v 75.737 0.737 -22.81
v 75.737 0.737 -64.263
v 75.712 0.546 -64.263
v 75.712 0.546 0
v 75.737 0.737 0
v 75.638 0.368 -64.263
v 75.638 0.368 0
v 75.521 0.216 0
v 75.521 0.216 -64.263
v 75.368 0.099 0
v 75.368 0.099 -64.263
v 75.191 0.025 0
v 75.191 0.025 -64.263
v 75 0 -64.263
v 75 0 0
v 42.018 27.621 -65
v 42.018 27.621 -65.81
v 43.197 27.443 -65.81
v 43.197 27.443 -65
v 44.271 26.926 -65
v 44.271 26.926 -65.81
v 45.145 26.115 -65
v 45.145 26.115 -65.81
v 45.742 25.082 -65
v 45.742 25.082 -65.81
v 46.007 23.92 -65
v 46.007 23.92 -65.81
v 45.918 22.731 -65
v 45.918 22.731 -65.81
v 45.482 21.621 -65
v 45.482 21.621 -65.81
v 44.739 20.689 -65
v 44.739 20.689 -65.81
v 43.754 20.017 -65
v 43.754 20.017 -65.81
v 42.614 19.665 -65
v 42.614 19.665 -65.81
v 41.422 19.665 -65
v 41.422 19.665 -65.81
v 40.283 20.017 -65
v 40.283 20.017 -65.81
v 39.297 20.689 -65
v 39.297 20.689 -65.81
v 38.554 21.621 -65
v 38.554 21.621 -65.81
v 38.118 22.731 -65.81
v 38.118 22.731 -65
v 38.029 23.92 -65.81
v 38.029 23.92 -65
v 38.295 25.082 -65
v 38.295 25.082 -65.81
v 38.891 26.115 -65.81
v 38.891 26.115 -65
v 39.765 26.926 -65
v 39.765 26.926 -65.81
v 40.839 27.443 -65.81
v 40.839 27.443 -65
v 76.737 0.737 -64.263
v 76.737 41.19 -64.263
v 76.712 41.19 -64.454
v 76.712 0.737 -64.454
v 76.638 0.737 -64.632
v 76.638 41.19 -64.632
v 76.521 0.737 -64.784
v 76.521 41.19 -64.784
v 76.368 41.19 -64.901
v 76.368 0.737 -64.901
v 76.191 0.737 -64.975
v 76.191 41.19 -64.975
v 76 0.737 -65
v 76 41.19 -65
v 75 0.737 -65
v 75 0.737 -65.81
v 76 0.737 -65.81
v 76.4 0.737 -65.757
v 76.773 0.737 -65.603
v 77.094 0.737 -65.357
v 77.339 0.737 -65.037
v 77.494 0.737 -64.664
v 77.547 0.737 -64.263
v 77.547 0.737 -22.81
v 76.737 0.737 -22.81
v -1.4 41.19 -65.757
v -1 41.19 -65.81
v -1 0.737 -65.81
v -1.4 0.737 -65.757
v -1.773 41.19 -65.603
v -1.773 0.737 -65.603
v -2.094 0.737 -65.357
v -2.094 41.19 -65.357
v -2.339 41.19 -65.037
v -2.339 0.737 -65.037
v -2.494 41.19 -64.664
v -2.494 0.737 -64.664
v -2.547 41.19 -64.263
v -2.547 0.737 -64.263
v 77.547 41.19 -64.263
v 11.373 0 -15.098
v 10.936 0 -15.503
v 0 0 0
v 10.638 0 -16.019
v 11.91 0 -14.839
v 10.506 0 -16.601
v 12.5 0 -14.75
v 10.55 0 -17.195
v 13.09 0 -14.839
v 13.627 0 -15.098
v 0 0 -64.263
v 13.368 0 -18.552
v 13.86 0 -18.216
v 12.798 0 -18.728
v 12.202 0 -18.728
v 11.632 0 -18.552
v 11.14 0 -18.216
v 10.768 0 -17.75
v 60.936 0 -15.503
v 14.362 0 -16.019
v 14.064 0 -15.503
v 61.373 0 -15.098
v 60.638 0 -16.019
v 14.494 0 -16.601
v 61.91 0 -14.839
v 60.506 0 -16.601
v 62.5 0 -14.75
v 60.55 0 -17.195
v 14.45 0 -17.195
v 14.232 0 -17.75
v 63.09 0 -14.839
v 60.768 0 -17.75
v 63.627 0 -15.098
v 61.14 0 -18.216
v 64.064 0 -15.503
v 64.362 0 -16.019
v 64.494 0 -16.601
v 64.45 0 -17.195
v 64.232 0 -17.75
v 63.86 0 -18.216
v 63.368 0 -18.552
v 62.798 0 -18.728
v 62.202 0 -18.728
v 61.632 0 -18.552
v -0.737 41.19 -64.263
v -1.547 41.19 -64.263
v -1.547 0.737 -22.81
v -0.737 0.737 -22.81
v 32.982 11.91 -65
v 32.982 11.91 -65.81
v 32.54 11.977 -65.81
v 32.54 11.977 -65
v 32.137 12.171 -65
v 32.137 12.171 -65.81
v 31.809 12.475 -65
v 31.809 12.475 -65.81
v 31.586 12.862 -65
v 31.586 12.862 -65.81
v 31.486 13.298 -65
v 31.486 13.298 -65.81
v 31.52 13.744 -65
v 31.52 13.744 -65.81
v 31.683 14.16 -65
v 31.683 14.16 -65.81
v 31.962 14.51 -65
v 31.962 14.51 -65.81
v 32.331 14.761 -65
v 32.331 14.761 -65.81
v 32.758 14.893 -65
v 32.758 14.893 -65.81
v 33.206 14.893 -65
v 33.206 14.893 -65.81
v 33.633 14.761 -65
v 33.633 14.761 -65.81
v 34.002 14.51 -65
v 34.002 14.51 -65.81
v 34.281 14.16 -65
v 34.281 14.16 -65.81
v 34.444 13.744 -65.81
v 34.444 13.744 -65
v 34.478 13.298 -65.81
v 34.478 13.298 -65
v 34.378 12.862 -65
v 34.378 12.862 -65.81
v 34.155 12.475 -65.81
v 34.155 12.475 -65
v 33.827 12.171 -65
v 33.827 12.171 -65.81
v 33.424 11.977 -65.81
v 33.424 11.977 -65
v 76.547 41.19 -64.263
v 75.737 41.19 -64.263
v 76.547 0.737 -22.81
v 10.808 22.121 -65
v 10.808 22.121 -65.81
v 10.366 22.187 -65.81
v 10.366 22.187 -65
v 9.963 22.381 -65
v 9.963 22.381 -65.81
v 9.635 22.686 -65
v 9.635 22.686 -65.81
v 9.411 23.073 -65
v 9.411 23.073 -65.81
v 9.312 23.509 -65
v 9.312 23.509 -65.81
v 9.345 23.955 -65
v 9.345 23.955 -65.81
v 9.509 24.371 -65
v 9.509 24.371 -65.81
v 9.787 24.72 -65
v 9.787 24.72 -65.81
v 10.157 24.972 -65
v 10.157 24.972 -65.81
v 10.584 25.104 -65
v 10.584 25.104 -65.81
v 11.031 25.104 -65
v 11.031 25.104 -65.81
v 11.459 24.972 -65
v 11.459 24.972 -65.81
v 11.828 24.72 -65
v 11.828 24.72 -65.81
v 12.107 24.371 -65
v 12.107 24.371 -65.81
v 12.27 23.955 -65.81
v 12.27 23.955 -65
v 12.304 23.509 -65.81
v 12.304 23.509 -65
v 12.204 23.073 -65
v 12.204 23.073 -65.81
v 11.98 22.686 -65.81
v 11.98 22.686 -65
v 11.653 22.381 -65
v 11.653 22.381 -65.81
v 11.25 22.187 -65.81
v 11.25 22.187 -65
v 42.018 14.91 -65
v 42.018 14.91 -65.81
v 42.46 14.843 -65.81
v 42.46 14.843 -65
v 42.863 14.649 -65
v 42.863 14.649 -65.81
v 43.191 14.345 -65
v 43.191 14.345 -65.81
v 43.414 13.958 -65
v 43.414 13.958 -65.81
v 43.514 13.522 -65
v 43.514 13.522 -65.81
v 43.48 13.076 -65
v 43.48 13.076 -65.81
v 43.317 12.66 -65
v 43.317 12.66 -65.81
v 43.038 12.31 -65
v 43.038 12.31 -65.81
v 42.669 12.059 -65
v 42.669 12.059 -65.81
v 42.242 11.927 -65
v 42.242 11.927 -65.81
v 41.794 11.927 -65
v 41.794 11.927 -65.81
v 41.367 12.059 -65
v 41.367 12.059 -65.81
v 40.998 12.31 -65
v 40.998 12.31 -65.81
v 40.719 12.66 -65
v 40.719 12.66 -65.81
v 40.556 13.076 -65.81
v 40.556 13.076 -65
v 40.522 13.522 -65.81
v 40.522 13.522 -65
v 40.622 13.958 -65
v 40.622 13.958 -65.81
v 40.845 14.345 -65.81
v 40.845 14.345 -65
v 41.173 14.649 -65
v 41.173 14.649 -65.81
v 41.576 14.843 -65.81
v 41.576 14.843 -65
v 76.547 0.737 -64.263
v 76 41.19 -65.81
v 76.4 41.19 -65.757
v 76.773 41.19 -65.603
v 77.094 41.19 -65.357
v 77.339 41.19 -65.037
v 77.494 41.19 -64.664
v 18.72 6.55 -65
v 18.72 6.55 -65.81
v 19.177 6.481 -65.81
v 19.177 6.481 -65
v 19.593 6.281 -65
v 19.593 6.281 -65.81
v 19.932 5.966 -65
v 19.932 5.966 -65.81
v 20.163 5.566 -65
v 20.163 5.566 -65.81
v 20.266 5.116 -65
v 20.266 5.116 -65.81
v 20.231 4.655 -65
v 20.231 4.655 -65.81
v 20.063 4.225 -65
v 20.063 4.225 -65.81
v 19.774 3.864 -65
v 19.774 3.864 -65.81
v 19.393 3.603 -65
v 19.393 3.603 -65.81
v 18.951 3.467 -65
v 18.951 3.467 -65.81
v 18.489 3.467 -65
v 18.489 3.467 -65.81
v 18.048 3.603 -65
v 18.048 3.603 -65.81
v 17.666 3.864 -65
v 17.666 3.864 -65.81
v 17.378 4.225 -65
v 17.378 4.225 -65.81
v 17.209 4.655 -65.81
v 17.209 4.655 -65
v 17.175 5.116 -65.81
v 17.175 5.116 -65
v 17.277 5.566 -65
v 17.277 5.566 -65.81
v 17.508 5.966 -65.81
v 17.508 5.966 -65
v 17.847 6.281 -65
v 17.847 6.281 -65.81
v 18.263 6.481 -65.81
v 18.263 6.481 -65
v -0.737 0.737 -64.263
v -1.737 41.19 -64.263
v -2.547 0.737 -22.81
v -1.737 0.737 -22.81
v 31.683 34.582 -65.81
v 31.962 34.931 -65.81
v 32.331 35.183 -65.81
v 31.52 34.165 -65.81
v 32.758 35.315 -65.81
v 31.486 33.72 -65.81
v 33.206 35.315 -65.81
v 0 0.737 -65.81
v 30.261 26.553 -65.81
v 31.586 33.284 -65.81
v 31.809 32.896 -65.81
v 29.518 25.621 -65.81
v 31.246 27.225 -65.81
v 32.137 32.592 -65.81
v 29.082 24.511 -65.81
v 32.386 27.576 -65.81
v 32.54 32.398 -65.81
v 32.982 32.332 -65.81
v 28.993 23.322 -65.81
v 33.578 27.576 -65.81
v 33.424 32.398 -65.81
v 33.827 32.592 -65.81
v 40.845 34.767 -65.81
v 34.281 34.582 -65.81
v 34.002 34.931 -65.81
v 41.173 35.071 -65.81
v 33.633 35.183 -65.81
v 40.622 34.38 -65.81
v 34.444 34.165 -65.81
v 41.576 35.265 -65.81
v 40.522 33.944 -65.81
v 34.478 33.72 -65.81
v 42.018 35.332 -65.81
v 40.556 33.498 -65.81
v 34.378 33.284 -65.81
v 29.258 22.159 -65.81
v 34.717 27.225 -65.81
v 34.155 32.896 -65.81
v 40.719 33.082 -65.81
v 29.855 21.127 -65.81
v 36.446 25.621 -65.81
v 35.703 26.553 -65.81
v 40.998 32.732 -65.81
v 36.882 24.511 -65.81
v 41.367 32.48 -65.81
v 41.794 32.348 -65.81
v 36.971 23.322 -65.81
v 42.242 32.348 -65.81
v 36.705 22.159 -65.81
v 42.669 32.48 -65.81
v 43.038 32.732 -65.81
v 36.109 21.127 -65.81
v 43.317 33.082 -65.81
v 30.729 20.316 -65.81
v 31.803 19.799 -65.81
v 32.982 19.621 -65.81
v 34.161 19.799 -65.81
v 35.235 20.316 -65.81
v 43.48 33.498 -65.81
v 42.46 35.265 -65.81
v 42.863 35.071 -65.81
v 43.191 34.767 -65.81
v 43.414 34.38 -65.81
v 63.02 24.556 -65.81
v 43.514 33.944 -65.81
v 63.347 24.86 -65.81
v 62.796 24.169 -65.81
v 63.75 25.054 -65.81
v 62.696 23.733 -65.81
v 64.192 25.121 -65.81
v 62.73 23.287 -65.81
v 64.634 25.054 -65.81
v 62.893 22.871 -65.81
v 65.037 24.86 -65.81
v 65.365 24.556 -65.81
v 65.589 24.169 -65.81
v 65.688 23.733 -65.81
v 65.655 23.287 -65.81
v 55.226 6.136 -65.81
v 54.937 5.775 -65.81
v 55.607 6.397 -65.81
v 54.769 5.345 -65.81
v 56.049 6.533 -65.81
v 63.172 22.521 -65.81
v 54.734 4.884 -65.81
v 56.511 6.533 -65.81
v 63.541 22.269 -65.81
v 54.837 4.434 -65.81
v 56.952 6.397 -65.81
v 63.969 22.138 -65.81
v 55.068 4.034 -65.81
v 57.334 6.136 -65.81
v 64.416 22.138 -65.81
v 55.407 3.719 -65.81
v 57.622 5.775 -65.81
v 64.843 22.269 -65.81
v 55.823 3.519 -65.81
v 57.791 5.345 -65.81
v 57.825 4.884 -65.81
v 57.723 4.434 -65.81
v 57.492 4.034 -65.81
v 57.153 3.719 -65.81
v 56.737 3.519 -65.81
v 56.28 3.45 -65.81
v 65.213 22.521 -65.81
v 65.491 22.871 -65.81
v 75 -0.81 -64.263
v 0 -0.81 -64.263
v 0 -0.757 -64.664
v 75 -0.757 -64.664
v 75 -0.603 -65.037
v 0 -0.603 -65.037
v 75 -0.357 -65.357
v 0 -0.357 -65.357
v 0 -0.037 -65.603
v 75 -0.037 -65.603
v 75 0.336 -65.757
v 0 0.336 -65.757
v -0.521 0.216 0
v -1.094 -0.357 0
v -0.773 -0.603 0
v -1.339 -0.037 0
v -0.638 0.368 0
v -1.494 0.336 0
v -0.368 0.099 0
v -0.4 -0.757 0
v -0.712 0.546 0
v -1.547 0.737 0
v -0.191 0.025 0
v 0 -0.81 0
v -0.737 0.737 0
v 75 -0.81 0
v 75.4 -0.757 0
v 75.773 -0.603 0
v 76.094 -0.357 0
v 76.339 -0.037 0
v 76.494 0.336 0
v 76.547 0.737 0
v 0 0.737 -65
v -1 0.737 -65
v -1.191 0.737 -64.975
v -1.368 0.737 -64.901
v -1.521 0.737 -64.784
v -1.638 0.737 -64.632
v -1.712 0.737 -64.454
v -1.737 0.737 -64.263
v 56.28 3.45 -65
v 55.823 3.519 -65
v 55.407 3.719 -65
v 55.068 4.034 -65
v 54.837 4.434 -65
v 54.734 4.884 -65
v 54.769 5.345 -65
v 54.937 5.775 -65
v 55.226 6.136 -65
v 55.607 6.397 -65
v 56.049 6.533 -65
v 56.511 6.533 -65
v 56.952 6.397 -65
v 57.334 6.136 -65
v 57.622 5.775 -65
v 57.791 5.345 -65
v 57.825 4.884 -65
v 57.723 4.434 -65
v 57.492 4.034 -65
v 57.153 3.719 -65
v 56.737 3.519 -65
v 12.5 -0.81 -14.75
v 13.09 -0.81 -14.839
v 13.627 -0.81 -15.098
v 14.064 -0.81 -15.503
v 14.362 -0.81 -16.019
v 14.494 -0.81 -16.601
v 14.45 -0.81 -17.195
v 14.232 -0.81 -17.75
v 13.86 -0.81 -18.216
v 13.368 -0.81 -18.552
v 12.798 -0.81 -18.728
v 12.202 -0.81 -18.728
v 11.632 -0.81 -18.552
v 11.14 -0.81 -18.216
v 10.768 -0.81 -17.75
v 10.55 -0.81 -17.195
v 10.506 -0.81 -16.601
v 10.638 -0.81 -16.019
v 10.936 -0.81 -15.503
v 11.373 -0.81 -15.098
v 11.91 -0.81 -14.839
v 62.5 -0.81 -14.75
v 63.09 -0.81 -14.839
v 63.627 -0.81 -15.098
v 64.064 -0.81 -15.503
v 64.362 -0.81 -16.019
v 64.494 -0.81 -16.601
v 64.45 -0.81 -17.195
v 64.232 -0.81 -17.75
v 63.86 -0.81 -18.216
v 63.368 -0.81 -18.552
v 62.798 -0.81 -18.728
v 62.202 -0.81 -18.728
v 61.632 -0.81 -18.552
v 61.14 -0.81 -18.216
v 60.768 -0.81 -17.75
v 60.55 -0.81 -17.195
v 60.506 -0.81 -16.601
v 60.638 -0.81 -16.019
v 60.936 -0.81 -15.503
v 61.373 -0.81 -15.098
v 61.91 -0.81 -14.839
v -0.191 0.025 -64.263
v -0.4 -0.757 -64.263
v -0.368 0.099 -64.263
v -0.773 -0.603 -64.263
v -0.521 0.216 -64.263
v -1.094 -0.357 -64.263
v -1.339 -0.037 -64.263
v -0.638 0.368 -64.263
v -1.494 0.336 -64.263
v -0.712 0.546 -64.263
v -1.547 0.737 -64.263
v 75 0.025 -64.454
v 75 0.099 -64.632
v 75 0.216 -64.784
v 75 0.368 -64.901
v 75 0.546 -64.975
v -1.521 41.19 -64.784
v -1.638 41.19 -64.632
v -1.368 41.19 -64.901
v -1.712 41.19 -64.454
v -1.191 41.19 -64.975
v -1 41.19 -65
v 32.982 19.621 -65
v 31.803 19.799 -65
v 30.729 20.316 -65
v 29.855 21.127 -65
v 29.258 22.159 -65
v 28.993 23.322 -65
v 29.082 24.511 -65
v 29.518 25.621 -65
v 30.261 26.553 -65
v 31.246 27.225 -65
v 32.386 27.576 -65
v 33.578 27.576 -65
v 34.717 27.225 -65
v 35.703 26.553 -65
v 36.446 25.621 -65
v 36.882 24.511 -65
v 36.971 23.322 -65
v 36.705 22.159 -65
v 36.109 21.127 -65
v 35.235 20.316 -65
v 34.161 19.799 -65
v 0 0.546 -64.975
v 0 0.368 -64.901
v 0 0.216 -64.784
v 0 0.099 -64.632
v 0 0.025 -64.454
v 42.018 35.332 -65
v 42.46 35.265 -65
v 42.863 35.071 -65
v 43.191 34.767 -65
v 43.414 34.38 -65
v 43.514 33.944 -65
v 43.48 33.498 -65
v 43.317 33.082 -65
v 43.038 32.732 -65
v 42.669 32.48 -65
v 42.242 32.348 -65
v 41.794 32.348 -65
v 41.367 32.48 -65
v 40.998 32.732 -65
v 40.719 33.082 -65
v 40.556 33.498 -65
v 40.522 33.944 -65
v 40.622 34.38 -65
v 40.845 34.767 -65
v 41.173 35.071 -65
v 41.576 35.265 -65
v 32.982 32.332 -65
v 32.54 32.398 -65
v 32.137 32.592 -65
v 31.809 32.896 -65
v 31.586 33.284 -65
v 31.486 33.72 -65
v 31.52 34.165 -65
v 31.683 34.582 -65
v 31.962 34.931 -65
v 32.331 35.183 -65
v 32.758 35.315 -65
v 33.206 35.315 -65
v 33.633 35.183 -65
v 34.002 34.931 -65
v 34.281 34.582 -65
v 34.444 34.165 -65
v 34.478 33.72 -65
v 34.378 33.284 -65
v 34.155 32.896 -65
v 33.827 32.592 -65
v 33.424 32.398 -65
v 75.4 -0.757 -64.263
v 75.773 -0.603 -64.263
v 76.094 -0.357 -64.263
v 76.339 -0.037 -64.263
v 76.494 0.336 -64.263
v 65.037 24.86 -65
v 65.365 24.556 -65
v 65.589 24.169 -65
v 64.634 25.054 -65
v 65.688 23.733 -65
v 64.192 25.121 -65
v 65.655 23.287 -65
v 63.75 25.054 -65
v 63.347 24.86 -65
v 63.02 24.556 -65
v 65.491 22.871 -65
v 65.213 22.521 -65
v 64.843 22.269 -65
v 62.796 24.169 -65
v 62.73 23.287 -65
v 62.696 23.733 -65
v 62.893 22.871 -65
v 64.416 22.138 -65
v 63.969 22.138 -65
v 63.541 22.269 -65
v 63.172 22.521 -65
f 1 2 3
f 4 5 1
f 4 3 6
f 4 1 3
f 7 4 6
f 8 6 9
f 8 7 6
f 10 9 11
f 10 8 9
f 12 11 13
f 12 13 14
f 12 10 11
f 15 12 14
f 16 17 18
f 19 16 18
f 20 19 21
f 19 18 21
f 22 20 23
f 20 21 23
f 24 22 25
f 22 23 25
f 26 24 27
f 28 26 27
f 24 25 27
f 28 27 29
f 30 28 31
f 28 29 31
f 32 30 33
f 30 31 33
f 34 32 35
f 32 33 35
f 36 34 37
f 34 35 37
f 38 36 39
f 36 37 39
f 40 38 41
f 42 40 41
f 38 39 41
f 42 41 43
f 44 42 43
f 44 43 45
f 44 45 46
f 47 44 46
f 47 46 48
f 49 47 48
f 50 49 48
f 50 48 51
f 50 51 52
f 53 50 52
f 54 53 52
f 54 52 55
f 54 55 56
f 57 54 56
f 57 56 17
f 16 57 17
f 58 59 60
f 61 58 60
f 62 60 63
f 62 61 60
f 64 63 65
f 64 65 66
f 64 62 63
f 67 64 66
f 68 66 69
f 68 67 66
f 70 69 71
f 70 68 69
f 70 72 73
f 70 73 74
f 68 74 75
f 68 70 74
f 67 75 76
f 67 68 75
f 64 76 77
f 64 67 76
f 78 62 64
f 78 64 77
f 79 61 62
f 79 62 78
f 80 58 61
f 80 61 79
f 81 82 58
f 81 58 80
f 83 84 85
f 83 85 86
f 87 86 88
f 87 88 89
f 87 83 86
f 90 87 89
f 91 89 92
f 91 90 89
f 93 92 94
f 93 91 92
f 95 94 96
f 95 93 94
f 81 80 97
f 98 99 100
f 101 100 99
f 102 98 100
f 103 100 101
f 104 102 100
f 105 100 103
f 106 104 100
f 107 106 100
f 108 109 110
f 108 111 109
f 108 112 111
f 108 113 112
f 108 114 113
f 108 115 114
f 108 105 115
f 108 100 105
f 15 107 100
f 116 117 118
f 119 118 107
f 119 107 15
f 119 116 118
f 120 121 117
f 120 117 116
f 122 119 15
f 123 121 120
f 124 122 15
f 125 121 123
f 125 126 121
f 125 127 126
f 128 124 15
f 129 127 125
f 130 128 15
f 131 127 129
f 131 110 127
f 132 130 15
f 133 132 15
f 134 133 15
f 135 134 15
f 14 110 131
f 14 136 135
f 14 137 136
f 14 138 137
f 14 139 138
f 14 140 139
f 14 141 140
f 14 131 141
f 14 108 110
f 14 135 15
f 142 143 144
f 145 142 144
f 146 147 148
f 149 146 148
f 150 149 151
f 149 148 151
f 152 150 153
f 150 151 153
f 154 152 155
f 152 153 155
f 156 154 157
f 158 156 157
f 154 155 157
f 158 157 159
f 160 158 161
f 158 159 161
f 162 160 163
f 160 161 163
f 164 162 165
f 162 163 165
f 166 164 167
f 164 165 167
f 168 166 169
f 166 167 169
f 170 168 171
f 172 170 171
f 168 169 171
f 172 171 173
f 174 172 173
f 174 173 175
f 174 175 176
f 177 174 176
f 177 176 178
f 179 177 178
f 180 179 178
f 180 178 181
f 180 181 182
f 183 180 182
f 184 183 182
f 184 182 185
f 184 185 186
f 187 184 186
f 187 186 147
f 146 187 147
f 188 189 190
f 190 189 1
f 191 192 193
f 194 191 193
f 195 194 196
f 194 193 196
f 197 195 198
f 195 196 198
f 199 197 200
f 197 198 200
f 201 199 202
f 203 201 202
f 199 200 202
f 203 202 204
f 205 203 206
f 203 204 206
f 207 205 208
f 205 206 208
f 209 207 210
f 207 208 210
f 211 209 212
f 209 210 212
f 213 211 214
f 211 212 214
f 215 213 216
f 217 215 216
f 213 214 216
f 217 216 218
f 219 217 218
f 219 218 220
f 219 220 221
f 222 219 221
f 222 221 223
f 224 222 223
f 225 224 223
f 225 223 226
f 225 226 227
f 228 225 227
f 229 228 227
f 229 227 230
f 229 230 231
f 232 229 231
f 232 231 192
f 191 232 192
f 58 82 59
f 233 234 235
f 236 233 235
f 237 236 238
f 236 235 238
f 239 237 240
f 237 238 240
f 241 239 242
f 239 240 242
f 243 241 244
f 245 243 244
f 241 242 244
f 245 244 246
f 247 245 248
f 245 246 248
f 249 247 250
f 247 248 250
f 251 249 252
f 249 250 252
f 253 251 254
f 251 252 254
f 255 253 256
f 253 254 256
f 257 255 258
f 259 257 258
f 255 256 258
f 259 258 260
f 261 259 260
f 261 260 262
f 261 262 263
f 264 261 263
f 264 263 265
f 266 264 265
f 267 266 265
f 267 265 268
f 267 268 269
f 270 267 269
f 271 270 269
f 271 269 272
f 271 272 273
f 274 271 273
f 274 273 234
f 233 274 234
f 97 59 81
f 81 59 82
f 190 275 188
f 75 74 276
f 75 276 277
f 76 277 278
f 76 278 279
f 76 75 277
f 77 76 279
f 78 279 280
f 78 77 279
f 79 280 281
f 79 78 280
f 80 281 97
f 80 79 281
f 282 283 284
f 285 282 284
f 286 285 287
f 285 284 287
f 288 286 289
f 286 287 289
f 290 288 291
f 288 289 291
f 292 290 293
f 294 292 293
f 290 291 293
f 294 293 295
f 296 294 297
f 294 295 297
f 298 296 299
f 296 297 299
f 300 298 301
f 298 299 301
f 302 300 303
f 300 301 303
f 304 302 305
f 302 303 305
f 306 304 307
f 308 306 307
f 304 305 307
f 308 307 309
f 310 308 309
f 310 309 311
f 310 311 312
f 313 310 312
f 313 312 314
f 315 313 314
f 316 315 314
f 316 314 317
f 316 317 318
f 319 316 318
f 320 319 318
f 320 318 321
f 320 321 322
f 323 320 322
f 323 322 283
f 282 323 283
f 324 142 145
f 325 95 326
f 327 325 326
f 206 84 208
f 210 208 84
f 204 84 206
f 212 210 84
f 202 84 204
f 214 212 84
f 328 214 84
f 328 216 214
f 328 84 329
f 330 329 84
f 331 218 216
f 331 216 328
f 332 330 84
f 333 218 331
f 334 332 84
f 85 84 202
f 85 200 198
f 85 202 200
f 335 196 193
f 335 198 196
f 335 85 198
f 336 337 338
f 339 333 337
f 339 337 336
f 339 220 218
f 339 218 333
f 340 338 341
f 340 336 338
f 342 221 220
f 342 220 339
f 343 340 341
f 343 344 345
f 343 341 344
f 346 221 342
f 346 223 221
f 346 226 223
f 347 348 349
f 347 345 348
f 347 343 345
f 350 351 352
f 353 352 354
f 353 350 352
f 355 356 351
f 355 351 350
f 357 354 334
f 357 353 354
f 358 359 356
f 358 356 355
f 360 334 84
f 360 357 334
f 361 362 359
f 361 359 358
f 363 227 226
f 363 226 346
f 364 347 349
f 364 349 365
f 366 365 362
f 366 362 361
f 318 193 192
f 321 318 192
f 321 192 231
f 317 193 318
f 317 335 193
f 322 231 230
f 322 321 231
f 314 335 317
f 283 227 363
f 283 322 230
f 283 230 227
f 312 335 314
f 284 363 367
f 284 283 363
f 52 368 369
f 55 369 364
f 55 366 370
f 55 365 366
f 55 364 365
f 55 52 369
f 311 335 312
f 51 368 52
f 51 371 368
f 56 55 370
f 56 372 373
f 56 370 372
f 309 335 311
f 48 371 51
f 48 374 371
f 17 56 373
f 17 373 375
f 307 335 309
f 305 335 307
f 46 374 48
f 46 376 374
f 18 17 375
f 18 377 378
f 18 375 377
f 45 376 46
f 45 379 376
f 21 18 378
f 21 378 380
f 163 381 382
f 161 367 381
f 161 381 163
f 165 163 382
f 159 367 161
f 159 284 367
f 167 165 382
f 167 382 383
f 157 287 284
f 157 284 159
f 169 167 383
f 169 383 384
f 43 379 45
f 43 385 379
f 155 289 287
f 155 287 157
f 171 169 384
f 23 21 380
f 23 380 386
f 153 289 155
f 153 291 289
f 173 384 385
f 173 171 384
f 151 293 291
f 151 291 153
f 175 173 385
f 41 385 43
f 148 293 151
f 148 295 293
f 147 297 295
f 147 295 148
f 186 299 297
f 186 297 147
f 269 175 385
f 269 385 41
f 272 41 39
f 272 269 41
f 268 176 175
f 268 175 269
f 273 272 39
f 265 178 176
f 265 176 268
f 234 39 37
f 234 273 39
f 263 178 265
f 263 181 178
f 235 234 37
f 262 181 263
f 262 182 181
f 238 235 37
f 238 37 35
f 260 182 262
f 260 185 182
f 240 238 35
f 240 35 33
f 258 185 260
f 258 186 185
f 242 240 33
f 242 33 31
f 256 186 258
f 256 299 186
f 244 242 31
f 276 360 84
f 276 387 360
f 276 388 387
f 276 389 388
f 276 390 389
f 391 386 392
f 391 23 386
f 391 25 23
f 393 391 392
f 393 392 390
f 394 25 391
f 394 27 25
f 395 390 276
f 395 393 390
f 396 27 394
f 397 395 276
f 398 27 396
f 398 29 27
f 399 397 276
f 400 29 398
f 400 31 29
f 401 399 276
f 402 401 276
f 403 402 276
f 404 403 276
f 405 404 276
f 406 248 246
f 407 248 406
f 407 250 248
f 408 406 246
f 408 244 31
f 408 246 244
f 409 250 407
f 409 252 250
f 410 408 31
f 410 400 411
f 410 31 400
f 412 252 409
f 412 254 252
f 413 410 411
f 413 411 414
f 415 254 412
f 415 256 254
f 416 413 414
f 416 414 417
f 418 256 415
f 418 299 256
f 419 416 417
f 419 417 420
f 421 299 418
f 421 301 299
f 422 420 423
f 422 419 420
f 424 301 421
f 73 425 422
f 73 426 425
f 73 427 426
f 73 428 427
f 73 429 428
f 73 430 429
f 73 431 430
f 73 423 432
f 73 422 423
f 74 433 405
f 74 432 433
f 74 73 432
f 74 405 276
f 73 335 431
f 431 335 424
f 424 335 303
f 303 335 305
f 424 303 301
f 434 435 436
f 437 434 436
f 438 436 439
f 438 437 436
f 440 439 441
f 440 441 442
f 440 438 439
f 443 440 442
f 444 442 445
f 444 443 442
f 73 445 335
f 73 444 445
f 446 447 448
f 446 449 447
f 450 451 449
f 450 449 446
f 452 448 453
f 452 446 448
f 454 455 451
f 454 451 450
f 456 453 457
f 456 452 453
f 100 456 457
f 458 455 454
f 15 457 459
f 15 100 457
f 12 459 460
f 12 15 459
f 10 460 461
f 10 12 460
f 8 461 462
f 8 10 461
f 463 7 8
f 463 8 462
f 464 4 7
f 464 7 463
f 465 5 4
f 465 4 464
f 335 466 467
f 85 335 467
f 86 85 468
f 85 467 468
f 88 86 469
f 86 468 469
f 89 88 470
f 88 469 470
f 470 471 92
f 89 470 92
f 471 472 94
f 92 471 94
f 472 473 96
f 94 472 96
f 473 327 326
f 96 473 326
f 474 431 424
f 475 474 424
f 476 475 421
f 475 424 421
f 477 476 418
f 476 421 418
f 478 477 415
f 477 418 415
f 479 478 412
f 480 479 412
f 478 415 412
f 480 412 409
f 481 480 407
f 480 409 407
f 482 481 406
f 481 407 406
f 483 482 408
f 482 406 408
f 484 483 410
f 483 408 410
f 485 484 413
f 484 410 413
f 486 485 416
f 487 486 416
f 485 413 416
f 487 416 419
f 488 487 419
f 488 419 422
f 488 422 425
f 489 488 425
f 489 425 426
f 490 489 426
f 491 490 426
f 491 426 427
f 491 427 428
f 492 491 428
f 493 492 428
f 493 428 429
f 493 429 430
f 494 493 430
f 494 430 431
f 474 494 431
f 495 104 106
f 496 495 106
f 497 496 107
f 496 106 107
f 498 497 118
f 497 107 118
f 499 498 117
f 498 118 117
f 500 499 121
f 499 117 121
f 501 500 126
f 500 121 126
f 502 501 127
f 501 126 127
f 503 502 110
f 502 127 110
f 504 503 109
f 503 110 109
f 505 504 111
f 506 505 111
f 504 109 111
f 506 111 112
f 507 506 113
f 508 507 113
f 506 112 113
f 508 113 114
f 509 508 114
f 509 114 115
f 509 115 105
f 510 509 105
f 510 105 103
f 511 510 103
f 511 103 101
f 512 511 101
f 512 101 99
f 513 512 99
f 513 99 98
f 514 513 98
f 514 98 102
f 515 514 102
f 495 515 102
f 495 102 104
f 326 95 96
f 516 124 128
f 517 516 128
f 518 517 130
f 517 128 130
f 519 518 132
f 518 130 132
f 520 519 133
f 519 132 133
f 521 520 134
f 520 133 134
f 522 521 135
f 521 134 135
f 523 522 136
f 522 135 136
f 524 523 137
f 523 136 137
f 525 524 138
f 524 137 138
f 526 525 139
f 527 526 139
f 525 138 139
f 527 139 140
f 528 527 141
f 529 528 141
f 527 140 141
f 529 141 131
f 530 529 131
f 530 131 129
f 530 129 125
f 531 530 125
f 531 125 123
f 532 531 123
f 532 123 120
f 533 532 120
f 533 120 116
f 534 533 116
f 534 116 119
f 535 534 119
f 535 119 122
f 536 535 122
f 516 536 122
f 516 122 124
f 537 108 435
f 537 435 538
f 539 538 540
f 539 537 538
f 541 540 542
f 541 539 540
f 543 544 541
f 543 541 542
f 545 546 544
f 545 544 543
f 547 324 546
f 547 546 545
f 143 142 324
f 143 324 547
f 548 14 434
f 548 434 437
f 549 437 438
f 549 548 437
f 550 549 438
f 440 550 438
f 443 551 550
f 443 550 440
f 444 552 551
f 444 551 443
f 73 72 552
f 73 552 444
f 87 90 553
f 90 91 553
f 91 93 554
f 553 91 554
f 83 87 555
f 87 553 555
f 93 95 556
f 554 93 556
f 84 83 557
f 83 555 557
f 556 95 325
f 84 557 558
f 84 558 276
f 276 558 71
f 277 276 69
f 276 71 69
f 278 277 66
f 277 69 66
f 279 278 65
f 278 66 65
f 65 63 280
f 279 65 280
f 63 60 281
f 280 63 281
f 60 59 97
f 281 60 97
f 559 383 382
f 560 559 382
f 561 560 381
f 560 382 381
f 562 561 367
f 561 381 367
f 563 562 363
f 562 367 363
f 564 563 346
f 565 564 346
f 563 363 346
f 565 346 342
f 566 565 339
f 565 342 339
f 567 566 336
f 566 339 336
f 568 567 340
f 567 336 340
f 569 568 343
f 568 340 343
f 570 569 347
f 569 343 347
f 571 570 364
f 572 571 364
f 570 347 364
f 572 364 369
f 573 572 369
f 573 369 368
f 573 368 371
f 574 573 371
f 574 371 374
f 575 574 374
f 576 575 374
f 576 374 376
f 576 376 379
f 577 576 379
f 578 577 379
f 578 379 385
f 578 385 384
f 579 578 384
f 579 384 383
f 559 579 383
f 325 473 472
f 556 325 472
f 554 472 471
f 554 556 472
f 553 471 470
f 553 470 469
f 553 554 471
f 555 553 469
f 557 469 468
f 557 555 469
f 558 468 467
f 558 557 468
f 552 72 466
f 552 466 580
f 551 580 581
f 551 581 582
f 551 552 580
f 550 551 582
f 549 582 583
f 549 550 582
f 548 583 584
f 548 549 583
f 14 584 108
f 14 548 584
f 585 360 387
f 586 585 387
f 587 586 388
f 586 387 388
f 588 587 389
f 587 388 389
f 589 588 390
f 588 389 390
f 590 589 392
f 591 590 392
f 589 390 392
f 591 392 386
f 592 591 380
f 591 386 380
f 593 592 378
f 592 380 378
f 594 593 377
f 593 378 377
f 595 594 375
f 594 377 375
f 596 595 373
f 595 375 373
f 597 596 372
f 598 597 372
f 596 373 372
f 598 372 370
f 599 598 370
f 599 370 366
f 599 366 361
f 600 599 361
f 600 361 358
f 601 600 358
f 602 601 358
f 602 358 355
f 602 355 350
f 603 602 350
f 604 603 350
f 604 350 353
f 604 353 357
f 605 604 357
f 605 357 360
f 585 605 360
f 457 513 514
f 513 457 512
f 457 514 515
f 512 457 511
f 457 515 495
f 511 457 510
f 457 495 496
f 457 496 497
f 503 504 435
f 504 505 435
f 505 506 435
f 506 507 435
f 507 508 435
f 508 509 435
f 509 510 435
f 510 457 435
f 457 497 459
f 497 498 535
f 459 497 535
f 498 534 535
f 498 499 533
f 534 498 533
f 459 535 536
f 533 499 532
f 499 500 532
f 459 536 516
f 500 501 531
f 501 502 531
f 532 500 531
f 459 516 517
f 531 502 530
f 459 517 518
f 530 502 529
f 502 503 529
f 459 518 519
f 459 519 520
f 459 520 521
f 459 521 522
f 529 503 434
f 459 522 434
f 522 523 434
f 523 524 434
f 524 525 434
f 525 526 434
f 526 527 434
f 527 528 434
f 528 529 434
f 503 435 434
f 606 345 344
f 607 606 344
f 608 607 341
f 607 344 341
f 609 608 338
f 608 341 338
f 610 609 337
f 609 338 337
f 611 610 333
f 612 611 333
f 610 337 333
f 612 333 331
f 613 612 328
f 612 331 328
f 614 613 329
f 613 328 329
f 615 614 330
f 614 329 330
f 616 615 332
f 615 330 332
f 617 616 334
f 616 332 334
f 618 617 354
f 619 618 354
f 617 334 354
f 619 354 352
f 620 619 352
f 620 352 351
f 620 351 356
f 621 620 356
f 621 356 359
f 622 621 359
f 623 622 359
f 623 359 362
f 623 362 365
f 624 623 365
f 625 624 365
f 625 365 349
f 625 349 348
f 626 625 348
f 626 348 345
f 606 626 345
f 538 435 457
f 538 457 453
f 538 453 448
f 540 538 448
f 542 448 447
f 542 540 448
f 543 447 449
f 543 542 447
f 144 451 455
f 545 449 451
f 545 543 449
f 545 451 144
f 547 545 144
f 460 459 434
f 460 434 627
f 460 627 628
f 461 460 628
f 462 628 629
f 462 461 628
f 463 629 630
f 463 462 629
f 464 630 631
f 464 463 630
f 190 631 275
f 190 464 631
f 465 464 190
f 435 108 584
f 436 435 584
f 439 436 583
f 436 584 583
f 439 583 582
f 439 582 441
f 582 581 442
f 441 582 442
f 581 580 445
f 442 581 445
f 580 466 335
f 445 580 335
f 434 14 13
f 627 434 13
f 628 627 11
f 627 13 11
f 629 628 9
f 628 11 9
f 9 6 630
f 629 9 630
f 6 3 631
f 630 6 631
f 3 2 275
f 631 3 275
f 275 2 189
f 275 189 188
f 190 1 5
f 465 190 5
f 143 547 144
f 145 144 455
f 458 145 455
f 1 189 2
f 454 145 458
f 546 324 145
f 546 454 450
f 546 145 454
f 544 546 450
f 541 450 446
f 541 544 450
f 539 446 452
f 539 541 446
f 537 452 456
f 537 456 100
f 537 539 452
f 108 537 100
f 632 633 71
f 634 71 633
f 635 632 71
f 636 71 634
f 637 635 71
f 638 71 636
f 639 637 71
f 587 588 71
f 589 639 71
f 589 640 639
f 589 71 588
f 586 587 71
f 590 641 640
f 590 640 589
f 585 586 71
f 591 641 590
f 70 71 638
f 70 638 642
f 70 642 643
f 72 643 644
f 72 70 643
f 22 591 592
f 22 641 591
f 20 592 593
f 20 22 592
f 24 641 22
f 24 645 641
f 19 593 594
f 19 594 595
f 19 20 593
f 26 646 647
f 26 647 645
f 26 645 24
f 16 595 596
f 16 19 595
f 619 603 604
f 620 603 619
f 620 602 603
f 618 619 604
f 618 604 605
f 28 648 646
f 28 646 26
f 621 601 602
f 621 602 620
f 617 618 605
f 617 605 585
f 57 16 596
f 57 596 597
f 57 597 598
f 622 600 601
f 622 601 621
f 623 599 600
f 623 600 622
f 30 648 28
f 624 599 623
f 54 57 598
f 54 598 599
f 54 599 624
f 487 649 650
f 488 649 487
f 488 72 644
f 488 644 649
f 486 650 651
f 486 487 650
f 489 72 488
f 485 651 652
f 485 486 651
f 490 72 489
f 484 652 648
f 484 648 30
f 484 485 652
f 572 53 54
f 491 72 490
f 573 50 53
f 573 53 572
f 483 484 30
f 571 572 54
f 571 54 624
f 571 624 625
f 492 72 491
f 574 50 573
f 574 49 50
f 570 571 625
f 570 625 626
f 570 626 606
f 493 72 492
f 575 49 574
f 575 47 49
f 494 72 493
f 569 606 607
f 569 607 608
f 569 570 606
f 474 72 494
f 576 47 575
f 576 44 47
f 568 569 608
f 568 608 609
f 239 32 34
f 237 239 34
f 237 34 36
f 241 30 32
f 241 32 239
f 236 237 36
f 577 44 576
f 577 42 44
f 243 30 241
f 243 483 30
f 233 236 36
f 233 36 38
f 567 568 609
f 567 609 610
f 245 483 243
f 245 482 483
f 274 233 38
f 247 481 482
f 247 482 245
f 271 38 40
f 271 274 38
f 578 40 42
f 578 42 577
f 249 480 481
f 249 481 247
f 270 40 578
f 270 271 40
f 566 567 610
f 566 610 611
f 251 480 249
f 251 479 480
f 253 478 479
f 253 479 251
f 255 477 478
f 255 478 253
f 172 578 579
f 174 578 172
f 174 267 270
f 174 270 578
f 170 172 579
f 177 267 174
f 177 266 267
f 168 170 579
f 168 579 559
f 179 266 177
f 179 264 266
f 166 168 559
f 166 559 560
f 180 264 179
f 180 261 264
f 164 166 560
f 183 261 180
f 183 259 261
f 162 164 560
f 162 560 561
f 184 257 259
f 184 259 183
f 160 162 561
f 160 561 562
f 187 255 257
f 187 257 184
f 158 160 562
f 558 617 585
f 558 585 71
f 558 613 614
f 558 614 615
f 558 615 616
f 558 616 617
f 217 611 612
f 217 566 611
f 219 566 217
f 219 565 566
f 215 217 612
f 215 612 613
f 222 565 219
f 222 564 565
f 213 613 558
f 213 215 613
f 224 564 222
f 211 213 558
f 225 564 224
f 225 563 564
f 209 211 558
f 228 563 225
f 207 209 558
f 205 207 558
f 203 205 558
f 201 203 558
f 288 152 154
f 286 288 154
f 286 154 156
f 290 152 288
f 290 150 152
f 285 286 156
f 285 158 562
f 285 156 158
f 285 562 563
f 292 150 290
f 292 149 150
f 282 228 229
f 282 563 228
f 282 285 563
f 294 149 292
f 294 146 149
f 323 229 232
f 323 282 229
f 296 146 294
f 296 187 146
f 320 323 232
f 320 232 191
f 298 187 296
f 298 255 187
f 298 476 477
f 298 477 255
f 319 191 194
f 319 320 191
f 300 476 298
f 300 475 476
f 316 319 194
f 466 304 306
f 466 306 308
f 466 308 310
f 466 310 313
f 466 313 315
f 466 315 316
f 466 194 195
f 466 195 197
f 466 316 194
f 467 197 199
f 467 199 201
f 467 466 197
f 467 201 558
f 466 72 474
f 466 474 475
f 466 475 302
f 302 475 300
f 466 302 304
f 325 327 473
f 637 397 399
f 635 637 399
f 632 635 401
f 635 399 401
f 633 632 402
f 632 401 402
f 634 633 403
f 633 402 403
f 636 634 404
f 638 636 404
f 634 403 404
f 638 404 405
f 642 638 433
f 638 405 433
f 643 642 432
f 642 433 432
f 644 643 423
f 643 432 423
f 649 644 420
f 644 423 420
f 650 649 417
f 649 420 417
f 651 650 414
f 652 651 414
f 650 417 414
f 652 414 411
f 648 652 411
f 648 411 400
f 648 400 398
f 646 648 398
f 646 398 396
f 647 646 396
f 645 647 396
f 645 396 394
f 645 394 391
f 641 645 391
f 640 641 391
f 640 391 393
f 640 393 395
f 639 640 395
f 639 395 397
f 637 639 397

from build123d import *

# Parameters (mm, degrees)
SKETCH1_W                    = 75
SKETCH1_H                    = 65
BASE_FLANGE1_DEPTH           = 0.81
EDGE_FLANGE1_STRIP_W         = 4.7132
EDGE_FLANGE1_STRIP_H         = 0.81
EDGE_FLANGE1_STRIP_CUT_DEPTH = 75
EDGE_FLANGE1_DEPTH           = 75
EDGE_FLANGE2_DEPTH           = 40.4534
EDGE_FLANGE2_BEND_DEPTH      = 40.4534
EDGE_FLANGE3_DEPTH           = 64.2634
EDGE_FLANGE3_BEND_DEPTH      = 64.2634
CUT_EXTRUDE1_REACH           = 113.546
CUT_EXTRUDE2_REACH           = 111.732
SKETCH24_R                   = 4
SKETCH24_R_2                 = 1.5
SKETCH24_R_3                 = 1.55
CUT_EXTRUDE3_REACH           = 111.732
SKETCH25_R                   = 2


# Sheet-metal steps are written as plain solids
with BuildPart() as part:
    # Sketch1 → Base-Flange1 (new body)
    with BuildSketch(Plane(origin=(0, 0, 0), x_dir=(1, 0, 0), z_dir=(0, 1, 0))):
        with Locations((37.5, 32.5)):
            Rectangle(SKETCH1_W, SKETCH1_H)
    extrude(amount=-BASE_FLANGE1_DEPTH)

    # Edge-Flange1 strip (across the edge) → Edge-Flange1 strip cut (cut)
    with BuildSketch(Plane(origin=(75, 0, -65), x_dir=(0, 0, 1), z_dir=(-1, 0, 0))):
        with Locations((-1.62, -0.405)):
            Rectangle(EDGE_FLANGE1_STRIP_W, EDGE_FLANGE1_STRIP_H)
    extrude(amount=EDGE_FLANGE1_STRIP_CUT_DEPTH, mode=Mode.SUBTRACT)

    # Edge-Flange1 section (across the edge) → Edge-Flange1 (add)
    with BuildSketch(Plane(origin=(75, 0, -65), x_dir=(0, 0, 1), z_dir=(-1, 0, 0))):
        with BuildLine():
            Line((-0.81, 0.7366), (-0.81, 41.19))
            Line((-0.81, 41.19), (0, 41.19))
            Line((0, 41.19), (0, 0.7366))
            ThreePointArc((0, 0.7366), (0.215745145, 0.215745145), (0.7366, 0))
            Line((0.7366, 0), (0.7366, -0.81))
            ThreePointArc((0.7366, -0.81), (-0.357011348, -0.357011348), (-0.81, 0.7366))
        make_face()
    extrude(amount=EDGE_FLANGE1_DEPTH)

    # Edge-Flange2 section (across the edge) → Edge-Flange2 (add)
    with BuildSketch(Plane(origin=(-1.7366, 41.19, -65), x_dir=(1, 0, 0), z_dir=(0, -1, 0))):
        with BuildLine():
            Line((-0.81, 0.7366), (-0.81, 42.19))
            Line((-0.81, 42.19), (0, 42.19))
            Line((0, 42.19), (0, 0.7366))
            ThreePointArc((0, 0.7366), (0.215745145, 0.215745145), (0.7366, 0))
            Line((0.7366, 0), (1.7366, 0))
            Line((1.7366, 0), (1.7366, -0.81))
            Line((1.7366, -0.81), (0.7366, -0.81))
            ThreePointArc((0.7366, -0.81), (-0.357011348, -0.357011348), (-0.81, 0.7366))
        make_face()
    extrude(amount=EDGE_FLANGE2_DEPTH)

    # Edge-Flange2 section 2 (across the edge) → Edge-Flange2 bend (add)
    with BuildSketch(Plane(origin=(76.7366, 0.7366, -65), x_dir=(-1, 0, 0), z_dir=(0, 1, 0))):
        with BuildLine():
            Line((-0.81, 0.7366), (-0.81, 42.19))
            Line((-0.81, 42.19), (0, 42.19))
            Line((0, 42.19), (0, 0.7366))
            ThreePointArc((0, 0.7366), (0.215745145, 0.215745145), (0.7366, 0))
            Line((0.7366, 0), (1.7366, 0))
            Line((1.7366, 0), (1.7366, -0.81))
            Line((1.7366, -0.81), (0.7366, -0.81))
            ThreePointArc((0.7366, -0.81), (-0.357011348, -0.357011348), (-0.81, 0.7366))
        make_face()
    extrude(amount=EDGE_FLANGE2_BEND_DEPTH)

    # Edge-Flange3 section (across the edge) → Edge-Flange3 (add)
    with BuildSketch(Plane(origin=(-0.7366, 0, -64.2634), x_dir=(1, 0, 0), z_dir=(0, 0, 1))):
        with BuildLine():
            Line((-0.81, 0.7366), (-0.81, 41.19))
            Line((-0.81, 41.19), (0, 41.19))
            Line((0, 41.19), (0, 0.7366))
            ThreePointArc((0, 0.7366), (0.215745145, 0.215745145), (0.7366, 0))
            Line((0.7366, 0), (0.7366, -0.81))
            ThreePointArc((0.7366, -0.81), (-0.357011348, -0.357011348), (-0.81, 0.7366))
        make_face()
    extrude(amount=EDGE_FLANGE3_DEPTH)

    # Edge-Flange3 section 2 (across the edge) → Edge-Flange3 bend (add)
    with BuildSketch(Plane(origin=(75.7366, 0, 0), x_dir=(-1, 0, 0), z_dir=(0, 0, -1))):
        with BuildLine():
            Line((-0.81, 0.7366), (-0.81, 41.19))
            Line((-0.81, 41.19), (0, 41.19))
            Line((0, 41.19), (0, 0.7366))
            ThreePointArc((0, 0.7366), (0.215745145, 0.215745145), (0.7366, 0))
            Line((0.7366, 0), (0.7366, -0.81))
            ThreePointArc((0.7366, -0.81), (-0.357011348, -0.357011348), (-0.81, 0.7366))
        make_face()
    extrude(amount=EDGE_FLANGE3_BEND_DEPTH)

    # Cut-Extrude1: up to this face of the body (flat: up to its plane)
    cut_extrude1_end = Plane(part.part.faces().sort_by_distance((77.5466, 20.9633, -43.5367))[0])
    # Sketch23 → Cut-Extrude1 (cut, up to the picked face)
    with BuildSketch(Plane.ZY.offset(2.5466), mode=Mode.PRIVATE) as cut_extrude1_sk1:
        Polygon((-64.2634, 41.19), (-22.81, 0.7366), (0, 0.7366), (0, 41.19), align=None)
    cut_extrude1_tool1 = split(extrude(cut_extrude1_sk1.sketch, amount=-CUT_EXTRUDE1_REACH, mode=Mode.PRIVATE), bisect_by=cut_extrude1_end, keep=Keep.BOTH, mode=Mode.PRIVATE)
    add(cut_extrude1_tool1.solids().sort_by(Axis((-2.5466, 24.173103, -23.412925), (1, 0, 0)))[0], mode=Mode.SUBTRACT)

    # Sketch24 → Cut-Extrude2 (cut, up to next)
    with BuildSketch(Plane(origin=(0, 0, -65.81), x_dir=(-1, 0, 0), z_dir=(0, 0, -1)), mode=Mode.PRIVATE) as cut_extrude2_sk1:
        with Locations(Location((-42.01805, 23.62082, 0), (0, 0, 90))):
            Circle(SKETCH24_R)
    cut_extrude2_tool1 = extrude(cut_extrude2_sk1.sketch, amount=-CUT_EXTRUDE2_REACH, mode=Mode.PRIVATE) & part.part
    # Sketch24 → Cut-Extrude2 (cut, up to next)
    with BuildSketch(Plane(origin=(0, 0, -65.81), x_dir=(-1, 0, 0), z_dir=(0, 0, -1)), mode=Mode.PRIVATE) as cut_extrude2_sk2:
        with Locations(Location((-42.01805, 33.83162, 0), (0, 0, 90))):
            Circle(SKETCH24_R_2)
    cut_extrude2_tool2 = extrude(cut_extrude2_sk2.sketch, amount=-CUT_EXTRUDE2_REACH, mode=Mode.PRIVATE) & part.part
    # Sketch24 → Cut-Extrude2 (cut, up to next)
    with BuildSketch(Plane(origin=(0, 0, -65.81), x_dir=(-1, 0, 0), z_dir=(0, 0, -1)), mode=Mode.PRIVATE) as cut_extrude2_sk3:
        with Locations(Location((-64.19225, 23.62082, 0), (0, 0, 90))):
            Circle(SKETCH24_R_2)
    cut_extrude2_tool3 = extrude(cut_extrude2_sk3.sketch, amount=-CUT_EXTRUDE2_REACH, mode=Mode.PRIVATE) & part.part
    # Sketch24 → Cut-Extrude2 (cut, up to next)
    with BuildSketch(Plane(origin=(0, 0, -65.81), x_dir=(-1, 0, 0), z_dir=(0, 0, -1)), mode=Mode.PRIVATE) as cut_extrude2_sk4:
        with Locations(Location((-42.01805, 13.41002, 0), (0, 0, 90))):
            Circle(SKETCH24_R_2)
    cut_extrude2_tool4 = extrude(cut_extrude2_sk4.sketch, amount=-CUT_EXTRUDE2_REACH, mode=Mode.PRIVATE) & part.part
    # Sketch24 → Cut-Extrude2 (cut, up to next)
    with BuildSketch(Plane(origin=(0, 0, -65.81), x_dir=(-1, 0, 0), z_dir=(0, 0, -1)), mode=Mode.PRIVATE) as cut_extrude2_sk5:
        with Locations(Location((-18.720201976, 5, 0), (0, 0, 90))):
            Circle(SKETCH24_R_3)
    cut_extrude2_tool5 = extrude(cut_extrude2_sk5.sketch, amount=-CUT_EXTRUDE2_REACH, mode=Mode.PRIVATE) & part.part
    # Sketch24 → Cut-Extrude2 (cut, up to next)
    with BuildSketch(Plane(origin=(0, 0, -65.81), x_dir=(-1, 0, 0), z_dir=(0, 0, -1)), mode=Mode.PRIVATE) as cut_extrude2_sk6:
        with Locations(Location((-56.279798024, 5, 0), (0, 0, 270))):
            Circle(SKETCH24_R_3)
    cut_extrude2_tool6 = extrude(cut_extrude2_sk6.sketch, amount=-CUT_EXTRUDE2_REACH, mode=Mode.PRIVATE) & part.part
    # Sketch24 → Cut-Extrude2 (cut, up to next)
    with BuildSketch(Plane(origin=(0, 0, -65.81), x_dir=(-1, 0, 0), z_dir=(0, 0, -1)), mode=Mode.PRIVATE) as cut_extrude2_sk7:
        with Locations(Location((-32.98195, 13.41002, 0), (0, 0, 270))):
            Circle(SKETCH24_R_2)
    cut_extrude2_tool7 = extrude(cut_extrude2_sk7.sketch, amount=-CUT_EXTRUDE2_REACH, mode=Mode.PRIVATE) & part.part
    # Sketch24 → Cut-Extrude2 (cut, up to next)
    with BuildSketch(Plane(origin=(0, 0, -65.81), x_dir=(-1, 0, 0), z_dir=(0, 0, -1)), mode=Mode.PRIVATE) as cut_extrude2_sk8:
        with Locations(Location((-10.80775, 23.62082, 0), (0, 0, 270))):
            Circle(SKETCH24_R_2)
    cut_extrude2_tool8 = extrude(cut_extrude2_sk8.sketch, amount=-CUT_EXTRUDE2_REACH, mode=Mode.PRIVATE) & part.part
    # Sketch24 → Cut-Extrude2 (cut, up to next)
    with BuildSketch(Plane(origin=(0, 0, -65.81), x_dir=(-1, 0, 0), z_dir=(0, 0, -1)), mode=Mode.PRIVATE) as cut_extrude2_sk9:
        with Locations(Location((-32.98195, 33.83162, 0), (0, 0, 270))):
            Circle(SKETCH24_R_2)
    cut_extrude2_tool9 = extrude(cut_extrude2_sk9.sketch, amount=-CUT_EXTRUDE2_REACH, mode=Mode.PRIVATE) & part.part
    # Sketch24 → Cut-Extrude2 (cut, up to next)
    with BuildSketch(Plane(origin=(0, 0, -65.81), x_dir=(-1, 0, 0), z_dir=(0, 0, -1)), mode=Mode.PRIVATE) as cut_extrude2_sk10:
        with Locations(Location((-32.98195, 23.62082, 0), (0, 0, 270))):
            Circle(SKETCH24_R)
    cut_extrude2_tool10 = extrude(cut_extrude2_sk10.sketch, amount=-CUT_EXTRUDE2_REACH, mode=Mode.PRIVATE) & part.part
    add(cut_extrude2_tool1.solids().sort_by_distance((42.01805, 23.62082, -65.81))[0], mode=Mode.SUBTRACT)
    add(cut_extrude2_tool2.solids().sort_by_distance((42.01805, 33.83162, -65.81))[0], mode=Mode.SUBTRACT)
    add(cut_extrude2_tool3.solids().sort_by_distance((64.19225, 23.62082, -65.81))[0], mode=Mode.SUBTRACT)
    add(cut_extrude2_tool4.solids().sort_by_distance((42.01805, 13.41002, -65.81))[0], mode=Mode.SUBTRACT)
    add(cut_extrude2_tool5.solids().sort_by_distance((18.720202, 5, -65.81))[0], mode=Mode.SUBTRACT)
    add(cut_extrude2_tool6.solids().sort_by_distance((56.279798, 5, -65.81))[0], mode=Mode.SUBTRACT)
    add(cut_extrude2_tool7.solids().sort_by_distance((32.98195, 13.41002, -65.81))[0], mode=Mode.SUBTRACT)
    add(cut_extrude2_tool8.solids().sort_by_distance((10.80775, 23.62082, -65.81))[0], mode=Mode.SUBTRACT)
    add(cut_extrude2_tool9.solids().sort_by_distance((32.98195, 33.83162, -65.81))[0], mode=Mode.SUBTRACT)
    add(cut_extrude2_tool10.solids().sort_by_distance((32.98195, 23.62082, -65.81))[0], mode=Mode.SUBTRACT)

    # Sketch25 → Cut-Extrude3 (cut, up to next)
    with BuildSketch(Plane(origin=(0, 0, 0), x_dir=(1, 0, 0), z_dir=(0, 1, 0)), mode=Mode.PRIVATE) as cut_extrude3_sk1:
        with Locations(Location((62.5, 16.75, 0), (0, 0, 270))):
            Circle(SKETCH25_R)
    cut_extrude3_tool1 = extrude(cut_extrude3_sk1.sketch, amount=-CUT_EXTRUDE3_REACH, mode=Mode.PRIVATE) & part.part
    # Sketch25 → Cut-Extrude3 (cut, up to next)
    with BuildSketch(Plane(origin=(0, 0, 0), x_dir=(1, 0, 0), z_dir=(0, 1, 0)), mode=Mode.PRIVATE) as cut_extrude3_sk2:
        with Locations(Location((12.5, 16.75, 0), (0, 0, 270))):
            Circle(SKETCH25_R)
    cut_extrude3_tool2 = extrude(cut_extrude3_sk2.sketch, amount=-CUT_EXTRUDE3_REACH, mode=Mode.PRIVATE) & part.part
    add(cut_extrude3_tool1.solids().sort_by_distance((62.5, 0, -16.75))[0], mode=Mode.SUBTRACT)
    add(cut_extrude3_tool2.solids().sort_by_distance((12.5, 0, -16.75))[0], mode=Mode.SUBTRACT)


solid = part.part
